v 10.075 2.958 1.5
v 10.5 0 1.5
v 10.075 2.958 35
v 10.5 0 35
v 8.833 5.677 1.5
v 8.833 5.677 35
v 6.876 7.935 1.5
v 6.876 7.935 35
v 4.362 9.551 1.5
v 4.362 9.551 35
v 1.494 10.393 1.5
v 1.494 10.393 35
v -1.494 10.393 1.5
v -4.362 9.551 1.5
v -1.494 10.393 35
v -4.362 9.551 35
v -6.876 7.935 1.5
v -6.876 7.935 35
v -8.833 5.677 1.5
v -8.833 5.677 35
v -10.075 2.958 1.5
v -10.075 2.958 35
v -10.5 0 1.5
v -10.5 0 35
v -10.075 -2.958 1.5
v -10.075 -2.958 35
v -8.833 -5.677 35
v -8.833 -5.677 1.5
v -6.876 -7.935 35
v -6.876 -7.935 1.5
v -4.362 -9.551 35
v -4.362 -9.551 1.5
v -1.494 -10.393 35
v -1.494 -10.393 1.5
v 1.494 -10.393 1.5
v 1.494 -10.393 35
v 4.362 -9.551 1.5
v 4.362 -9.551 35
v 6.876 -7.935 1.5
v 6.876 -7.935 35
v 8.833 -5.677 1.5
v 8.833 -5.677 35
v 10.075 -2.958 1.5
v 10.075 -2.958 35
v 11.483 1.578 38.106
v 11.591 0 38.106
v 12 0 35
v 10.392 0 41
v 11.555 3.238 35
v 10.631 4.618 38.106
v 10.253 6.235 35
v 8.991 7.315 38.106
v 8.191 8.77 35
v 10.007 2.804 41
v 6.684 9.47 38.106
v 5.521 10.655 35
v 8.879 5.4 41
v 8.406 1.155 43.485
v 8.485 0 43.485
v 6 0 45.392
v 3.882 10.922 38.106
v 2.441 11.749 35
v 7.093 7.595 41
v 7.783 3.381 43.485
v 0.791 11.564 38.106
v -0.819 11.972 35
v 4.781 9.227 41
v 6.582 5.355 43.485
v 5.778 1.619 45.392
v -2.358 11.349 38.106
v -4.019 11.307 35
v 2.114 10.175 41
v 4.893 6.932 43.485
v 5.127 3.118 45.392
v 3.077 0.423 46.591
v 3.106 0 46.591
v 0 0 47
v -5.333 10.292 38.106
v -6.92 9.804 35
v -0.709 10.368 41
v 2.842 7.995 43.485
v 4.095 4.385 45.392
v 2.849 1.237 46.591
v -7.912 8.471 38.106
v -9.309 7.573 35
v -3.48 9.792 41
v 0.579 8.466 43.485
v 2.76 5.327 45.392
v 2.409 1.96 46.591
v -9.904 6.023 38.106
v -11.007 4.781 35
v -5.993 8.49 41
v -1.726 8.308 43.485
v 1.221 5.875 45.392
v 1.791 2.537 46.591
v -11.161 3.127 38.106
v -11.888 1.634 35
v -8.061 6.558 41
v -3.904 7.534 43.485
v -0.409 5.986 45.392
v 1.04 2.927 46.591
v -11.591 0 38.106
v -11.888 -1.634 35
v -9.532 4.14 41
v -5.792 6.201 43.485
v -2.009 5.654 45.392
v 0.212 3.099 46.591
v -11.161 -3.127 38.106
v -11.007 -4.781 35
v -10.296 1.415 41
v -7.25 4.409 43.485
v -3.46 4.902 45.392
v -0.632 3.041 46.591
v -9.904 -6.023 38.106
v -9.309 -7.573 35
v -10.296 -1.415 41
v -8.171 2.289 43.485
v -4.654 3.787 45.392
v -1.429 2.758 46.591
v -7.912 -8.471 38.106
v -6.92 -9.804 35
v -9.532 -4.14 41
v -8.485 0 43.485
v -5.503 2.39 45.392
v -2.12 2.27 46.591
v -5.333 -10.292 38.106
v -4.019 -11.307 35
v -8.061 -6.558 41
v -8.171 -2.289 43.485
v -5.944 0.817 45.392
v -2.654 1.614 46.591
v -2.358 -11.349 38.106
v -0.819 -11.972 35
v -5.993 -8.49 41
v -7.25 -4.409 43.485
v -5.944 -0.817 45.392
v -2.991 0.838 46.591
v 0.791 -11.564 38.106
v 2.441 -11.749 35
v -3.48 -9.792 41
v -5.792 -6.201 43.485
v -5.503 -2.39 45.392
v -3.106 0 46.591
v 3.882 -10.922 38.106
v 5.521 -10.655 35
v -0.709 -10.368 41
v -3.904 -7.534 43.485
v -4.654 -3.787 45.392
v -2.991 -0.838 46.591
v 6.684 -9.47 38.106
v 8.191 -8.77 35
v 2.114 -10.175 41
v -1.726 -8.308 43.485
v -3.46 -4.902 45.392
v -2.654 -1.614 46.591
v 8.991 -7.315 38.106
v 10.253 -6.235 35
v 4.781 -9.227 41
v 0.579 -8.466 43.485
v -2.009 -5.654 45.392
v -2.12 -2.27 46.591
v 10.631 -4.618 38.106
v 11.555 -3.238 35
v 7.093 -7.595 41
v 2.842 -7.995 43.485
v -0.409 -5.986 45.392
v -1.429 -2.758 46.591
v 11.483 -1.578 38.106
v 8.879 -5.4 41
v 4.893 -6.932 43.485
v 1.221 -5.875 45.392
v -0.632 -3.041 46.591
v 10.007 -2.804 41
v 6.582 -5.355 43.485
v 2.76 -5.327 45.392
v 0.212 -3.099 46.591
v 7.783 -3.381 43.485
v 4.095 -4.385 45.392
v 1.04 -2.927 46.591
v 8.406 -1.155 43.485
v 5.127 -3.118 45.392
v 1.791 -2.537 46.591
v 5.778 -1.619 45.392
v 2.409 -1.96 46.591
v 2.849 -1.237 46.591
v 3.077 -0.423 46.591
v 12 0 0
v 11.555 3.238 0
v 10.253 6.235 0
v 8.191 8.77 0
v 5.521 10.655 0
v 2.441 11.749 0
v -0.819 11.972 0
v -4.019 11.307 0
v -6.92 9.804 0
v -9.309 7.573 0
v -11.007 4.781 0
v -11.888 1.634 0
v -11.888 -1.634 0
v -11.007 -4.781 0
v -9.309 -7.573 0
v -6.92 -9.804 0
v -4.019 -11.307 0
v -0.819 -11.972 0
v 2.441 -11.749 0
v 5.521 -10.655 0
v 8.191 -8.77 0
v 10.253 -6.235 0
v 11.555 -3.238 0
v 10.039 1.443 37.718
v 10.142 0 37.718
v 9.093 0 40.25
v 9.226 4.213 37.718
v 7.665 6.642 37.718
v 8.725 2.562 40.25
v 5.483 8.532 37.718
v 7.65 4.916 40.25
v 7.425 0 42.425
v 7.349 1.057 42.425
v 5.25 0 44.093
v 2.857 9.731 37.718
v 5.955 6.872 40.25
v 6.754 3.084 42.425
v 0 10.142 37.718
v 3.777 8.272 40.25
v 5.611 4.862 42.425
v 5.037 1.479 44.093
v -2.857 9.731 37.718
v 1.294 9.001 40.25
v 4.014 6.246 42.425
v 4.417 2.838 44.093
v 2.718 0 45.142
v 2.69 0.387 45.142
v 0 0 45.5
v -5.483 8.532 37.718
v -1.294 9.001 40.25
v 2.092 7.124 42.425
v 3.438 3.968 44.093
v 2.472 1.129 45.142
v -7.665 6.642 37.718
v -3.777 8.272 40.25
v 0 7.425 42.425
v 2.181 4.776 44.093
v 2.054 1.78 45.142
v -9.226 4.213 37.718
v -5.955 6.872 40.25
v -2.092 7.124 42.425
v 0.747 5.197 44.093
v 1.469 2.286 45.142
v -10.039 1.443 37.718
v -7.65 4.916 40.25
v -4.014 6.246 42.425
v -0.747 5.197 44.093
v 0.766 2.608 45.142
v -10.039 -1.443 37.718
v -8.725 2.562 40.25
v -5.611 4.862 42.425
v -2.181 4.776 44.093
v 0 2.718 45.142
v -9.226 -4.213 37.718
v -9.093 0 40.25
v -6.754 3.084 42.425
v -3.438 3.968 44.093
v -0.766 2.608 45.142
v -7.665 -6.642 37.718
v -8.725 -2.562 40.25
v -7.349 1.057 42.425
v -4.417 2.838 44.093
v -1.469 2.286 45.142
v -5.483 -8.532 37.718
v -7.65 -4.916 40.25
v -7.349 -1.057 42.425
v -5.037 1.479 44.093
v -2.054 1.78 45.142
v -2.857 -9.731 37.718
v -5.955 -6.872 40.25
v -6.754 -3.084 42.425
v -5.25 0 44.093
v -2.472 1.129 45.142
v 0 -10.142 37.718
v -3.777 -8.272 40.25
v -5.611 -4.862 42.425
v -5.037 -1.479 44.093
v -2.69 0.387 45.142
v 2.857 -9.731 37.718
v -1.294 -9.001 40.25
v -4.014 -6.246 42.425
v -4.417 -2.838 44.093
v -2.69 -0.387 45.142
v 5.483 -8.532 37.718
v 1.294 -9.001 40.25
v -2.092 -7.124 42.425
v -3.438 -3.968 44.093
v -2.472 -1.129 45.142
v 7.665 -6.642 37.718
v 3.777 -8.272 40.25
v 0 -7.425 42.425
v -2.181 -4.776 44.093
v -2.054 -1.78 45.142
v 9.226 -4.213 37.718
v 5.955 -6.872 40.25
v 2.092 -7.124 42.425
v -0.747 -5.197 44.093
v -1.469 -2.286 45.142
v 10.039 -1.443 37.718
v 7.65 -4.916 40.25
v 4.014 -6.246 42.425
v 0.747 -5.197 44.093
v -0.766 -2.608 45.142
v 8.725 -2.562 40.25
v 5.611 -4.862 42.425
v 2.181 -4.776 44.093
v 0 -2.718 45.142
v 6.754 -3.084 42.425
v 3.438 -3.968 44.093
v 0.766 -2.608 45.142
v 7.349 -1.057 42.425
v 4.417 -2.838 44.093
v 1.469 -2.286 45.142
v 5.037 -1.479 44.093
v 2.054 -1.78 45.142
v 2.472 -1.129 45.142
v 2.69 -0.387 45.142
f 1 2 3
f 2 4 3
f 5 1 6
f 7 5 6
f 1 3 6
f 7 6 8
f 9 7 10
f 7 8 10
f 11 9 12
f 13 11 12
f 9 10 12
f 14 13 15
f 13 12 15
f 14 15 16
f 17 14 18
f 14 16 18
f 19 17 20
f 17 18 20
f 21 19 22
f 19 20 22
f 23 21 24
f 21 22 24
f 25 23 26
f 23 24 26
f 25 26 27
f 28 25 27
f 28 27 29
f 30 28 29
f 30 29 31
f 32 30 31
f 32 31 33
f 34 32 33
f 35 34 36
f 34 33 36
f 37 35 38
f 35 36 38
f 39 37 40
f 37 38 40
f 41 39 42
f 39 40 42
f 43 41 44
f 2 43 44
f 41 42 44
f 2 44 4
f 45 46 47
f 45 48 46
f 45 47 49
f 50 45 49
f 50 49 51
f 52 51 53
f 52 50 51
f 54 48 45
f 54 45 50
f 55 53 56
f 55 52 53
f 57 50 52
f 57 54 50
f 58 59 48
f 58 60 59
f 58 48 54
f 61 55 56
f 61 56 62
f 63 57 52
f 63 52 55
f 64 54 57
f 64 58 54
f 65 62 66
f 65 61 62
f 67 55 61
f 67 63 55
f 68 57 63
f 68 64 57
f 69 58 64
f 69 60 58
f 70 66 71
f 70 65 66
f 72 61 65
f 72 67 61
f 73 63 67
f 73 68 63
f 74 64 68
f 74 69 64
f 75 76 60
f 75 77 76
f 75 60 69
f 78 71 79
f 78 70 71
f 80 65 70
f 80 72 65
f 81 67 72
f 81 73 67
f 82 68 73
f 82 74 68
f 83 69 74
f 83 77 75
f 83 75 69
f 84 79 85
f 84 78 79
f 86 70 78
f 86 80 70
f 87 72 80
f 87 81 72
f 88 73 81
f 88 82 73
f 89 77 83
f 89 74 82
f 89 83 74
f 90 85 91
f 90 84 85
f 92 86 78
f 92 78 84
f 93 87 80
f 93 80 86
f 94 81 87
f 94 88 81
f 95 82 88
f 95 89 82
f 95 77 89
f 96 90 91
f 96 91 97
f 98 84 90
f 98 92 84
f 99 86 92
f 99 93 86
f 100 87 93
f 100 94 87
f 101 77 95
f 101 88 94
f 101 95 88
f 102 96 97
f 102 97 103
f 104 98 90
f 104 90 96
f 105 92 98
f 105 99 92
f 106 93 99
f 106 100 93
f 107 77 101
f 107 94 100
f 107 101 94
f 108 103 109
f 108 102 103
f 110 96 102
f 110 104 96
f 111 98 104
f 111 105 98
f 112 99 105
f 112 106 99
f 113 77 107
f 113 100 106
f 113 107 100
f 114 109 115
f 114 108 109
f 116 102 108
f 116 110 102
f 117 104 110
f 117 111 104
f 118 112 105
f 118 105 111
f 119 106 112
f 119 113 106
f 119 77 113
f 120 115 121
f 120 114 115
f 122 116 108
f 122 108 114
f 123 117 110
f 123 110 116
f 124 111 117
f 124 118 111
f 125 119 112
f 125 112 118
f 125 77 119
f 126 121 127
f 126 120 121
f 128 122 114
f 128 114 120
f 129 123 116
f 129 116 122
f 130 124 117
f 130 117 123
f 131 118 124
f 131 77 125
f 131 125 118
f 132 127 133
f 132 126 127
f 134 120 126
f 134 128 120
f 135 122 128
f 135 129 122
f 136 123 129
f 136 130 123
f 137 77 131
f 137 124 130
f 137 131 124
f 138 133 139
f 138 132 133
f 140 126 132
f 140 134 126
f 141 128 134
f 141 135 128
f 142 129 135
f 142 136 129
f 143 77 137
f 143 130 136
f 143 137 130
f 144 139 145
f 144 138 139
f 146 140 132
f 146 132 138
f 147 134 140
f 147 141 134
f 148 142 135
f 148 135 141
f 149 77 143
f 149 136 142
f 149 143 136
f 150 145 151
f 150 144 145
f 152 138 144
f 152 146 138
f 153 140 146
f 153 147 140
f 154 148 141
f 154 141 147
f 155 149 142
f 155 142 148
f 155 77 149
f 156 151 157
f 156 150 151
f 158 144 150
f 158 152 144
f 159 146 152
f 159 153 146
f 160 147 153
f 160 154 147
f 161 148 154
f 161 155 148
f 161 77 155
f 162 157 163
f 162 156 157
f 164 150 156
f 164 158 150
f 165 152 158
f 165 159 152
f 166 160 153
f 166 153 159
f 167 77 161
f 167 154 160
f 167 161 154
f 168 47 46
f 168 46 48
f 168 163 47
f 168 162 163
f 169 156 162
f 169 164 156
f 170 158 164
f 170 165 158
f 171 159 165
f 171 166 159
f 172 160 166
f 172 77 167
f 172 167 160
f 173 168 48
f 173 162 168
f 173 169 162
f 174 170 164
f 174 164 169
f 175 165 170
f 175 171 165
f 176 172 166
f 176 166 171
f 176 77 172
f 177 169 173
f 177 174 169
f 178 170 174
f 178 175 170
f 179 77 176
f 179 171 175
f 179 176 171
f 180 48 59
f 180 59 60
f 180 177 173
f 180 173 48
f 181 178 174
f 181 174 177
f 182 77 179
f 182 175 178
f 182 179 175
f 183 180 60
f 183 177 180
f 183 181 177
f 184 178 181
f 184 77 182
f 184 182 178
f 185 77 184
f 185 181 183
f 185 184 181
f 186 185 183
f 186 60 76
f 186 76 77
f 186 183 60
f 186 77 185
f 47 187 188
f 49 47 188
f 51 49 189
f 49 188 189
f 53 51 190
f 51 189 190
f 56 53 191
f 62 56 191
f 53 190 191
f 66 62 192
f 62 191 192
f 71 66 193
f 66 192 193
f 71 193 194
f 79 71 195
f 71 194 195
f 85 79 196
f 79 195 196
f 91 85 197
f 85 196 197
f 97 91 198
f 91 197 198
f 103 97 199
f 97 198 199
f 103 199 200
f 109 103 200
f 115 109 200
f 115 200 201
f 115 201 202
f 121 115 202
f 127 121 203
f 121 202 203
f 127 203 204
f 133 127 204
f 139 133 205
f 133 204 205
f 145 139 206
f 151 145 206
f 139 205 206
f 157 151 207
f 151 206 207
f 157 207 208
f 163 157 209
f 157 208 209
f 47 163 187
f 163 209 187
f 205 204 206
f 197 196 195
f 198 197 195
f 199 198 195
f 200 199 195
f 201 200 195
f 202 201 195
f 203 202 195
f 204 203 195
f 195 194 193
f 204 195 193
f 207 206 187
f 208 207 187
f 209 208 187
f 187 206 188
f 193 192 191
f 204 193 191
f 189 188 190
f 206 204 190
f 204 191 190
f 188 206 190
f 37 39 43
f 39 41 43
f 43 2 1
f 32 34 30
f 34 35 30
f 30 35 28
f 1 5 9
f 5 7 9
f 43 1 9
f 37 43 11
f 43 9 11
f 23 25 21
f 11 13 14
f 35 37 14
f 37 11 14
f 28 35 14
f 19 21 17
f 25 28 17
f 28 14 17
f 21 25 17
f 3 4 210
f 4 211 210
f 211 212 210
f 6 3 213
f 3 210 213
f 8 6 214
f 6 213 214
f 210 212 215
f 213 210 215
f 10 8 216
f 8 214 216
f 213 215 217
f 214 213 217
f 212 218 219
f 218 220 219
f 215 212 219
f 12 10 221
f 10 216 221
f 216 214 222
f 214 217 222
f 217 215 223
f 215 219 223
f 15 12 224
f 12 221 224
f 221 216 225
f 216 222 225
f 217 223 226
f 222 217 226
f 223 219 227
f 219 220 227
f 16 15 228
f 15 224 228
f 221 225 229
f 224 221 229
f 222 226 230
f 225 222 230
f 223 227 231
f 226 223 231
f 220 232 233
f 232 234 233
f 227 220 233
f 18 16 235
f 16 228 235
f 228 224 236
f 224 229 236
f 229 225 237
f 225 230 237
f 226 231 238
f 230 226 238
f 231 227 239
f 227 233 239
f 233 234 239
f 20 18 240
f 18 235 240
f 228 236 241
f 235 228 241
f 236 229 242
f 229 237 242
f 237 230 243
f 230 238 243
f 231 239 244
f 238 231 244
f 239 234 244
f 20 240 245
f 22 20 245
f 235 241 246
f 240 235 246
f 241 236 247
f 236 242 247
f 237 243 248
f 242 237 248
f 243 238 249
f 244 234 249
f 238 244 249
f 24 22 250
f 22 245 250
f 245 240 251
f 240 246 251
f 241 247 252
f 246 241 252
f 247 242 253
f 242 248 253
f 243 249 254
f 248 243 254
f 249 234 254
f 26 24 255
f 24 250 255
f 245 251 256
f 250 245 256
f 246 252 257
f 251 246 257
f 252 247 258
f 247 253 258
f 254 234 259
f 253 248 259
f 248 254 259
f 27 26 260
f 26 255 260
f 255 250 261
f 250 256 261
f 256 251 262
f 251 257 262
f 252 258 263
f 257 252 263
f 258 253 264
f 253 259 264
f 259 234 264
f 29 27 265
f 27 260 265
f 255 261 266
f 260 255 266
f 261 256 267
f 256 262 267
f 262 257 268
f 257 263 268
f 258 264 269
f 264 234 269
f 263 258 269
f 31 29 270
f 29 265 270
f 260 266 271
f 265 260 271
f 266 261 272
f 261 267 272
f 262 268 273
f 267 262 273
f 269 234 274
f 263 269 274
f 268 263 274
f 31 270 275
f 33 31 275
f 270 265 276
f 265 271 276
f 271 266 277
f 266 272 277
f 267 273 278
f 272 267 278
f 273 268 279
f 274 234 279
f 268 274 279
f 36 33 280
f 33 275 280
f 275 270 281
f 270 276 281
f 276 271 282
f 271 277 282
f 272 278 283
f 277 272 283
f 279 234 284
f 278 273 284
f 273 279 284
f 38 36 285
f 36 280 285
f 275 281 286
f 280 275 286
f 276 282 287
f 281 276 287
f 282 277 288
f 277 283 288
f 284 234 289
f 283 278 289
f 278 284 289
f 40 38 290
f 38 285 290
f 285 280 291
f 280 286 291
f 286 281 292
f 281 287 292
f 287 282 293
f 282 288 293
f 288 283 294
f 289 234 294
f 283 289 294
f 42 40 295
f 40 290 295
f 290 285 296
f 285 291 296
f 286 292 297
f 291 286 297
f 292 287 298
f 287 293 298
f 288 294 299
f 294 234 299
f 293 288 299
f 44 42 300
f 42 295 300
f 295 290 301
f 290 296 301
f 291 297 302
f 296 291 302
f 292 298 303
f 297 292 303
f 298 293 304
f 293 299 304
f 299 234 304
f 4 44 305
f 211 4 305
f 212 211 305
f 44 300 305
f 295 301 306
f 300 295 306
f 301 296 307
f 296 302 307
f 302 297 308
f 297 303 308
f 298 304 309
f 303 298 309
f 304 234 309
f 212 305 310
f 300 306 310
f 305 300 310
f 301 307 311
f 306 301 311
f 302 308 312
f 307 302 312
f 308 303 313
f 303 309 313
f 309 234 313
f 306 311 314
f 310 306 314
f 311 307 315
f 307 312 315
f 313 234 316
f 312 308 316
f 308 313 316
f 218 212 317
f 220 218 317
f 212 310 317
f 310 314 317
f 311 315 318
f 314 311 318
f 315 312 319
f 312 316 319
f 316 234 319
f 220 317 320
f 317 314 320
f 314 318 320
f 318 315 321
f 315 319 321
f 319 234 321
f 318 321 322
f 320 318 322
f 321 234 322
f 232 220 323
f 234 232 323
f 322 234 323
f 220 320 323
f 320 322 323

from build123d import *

# Parameters (mm, degrees)
SKETCH1_R           = 12
BOSS_EXTRUDE1_DEPTH = 35
DOME1_FACE_RADIUS   = 12
DOME1_HEIGHT        = 12


# Read off the part's stored shape, not the designer's step: Shell1
with BuildPart() as part:
    # Sketch1 → Boss-Extrude1 (new body)
    with BuildSketch(Plane.XY):
        Circle(SKETCH1_R)
    extrude(amount=BOSS_EXTRUDE1_DEPTH)

    # Dome1: a dome of height H over a round flat face of radius A is a cap of a sphere of radius (A * A + H * H) / (2 * H)
    dome1_r = (DOME1_FACE_RADIUS * DOME1_FACE_RADIUS + DOME1_HEIGHT * DOME1_HEIGHT) / (2 * DOME1_HEIGHT)
    dome1_base = Plane((0, 0, 35), z_dir=(0, 0, 1))
    with Locations(dome1_base.offset(DOME1_HEIGHT - dome1_r)):
        dome1_ball = Sphere(dome1_r, mode=Mode.PRIVATE)
    add(split(dome1_ball, bisect_by=dome1_base, keep=Keep.TOP, mode=Mode.PRIVATE))

    # Shell1 outline → Shell1 (revolve, cut)
    with BuildSketch(Plane.XZ):
        with BuildLine():
            Line((10.5, 1.5), (10.5, 34.999999989))
            ThreePointArc((10.5, 34.999999989), (7.424621206, 42.424621199), (0, 45.5))
            Line((0, 45.5), (0, 1.5))
            Line((0, 1.5), (10.5, 1.5))
        make_face()
    revolve(axis=Axis((0, 0, 0), (0, 0, 1)), mode=Mode.SUBTRACT)


solid = part.part
